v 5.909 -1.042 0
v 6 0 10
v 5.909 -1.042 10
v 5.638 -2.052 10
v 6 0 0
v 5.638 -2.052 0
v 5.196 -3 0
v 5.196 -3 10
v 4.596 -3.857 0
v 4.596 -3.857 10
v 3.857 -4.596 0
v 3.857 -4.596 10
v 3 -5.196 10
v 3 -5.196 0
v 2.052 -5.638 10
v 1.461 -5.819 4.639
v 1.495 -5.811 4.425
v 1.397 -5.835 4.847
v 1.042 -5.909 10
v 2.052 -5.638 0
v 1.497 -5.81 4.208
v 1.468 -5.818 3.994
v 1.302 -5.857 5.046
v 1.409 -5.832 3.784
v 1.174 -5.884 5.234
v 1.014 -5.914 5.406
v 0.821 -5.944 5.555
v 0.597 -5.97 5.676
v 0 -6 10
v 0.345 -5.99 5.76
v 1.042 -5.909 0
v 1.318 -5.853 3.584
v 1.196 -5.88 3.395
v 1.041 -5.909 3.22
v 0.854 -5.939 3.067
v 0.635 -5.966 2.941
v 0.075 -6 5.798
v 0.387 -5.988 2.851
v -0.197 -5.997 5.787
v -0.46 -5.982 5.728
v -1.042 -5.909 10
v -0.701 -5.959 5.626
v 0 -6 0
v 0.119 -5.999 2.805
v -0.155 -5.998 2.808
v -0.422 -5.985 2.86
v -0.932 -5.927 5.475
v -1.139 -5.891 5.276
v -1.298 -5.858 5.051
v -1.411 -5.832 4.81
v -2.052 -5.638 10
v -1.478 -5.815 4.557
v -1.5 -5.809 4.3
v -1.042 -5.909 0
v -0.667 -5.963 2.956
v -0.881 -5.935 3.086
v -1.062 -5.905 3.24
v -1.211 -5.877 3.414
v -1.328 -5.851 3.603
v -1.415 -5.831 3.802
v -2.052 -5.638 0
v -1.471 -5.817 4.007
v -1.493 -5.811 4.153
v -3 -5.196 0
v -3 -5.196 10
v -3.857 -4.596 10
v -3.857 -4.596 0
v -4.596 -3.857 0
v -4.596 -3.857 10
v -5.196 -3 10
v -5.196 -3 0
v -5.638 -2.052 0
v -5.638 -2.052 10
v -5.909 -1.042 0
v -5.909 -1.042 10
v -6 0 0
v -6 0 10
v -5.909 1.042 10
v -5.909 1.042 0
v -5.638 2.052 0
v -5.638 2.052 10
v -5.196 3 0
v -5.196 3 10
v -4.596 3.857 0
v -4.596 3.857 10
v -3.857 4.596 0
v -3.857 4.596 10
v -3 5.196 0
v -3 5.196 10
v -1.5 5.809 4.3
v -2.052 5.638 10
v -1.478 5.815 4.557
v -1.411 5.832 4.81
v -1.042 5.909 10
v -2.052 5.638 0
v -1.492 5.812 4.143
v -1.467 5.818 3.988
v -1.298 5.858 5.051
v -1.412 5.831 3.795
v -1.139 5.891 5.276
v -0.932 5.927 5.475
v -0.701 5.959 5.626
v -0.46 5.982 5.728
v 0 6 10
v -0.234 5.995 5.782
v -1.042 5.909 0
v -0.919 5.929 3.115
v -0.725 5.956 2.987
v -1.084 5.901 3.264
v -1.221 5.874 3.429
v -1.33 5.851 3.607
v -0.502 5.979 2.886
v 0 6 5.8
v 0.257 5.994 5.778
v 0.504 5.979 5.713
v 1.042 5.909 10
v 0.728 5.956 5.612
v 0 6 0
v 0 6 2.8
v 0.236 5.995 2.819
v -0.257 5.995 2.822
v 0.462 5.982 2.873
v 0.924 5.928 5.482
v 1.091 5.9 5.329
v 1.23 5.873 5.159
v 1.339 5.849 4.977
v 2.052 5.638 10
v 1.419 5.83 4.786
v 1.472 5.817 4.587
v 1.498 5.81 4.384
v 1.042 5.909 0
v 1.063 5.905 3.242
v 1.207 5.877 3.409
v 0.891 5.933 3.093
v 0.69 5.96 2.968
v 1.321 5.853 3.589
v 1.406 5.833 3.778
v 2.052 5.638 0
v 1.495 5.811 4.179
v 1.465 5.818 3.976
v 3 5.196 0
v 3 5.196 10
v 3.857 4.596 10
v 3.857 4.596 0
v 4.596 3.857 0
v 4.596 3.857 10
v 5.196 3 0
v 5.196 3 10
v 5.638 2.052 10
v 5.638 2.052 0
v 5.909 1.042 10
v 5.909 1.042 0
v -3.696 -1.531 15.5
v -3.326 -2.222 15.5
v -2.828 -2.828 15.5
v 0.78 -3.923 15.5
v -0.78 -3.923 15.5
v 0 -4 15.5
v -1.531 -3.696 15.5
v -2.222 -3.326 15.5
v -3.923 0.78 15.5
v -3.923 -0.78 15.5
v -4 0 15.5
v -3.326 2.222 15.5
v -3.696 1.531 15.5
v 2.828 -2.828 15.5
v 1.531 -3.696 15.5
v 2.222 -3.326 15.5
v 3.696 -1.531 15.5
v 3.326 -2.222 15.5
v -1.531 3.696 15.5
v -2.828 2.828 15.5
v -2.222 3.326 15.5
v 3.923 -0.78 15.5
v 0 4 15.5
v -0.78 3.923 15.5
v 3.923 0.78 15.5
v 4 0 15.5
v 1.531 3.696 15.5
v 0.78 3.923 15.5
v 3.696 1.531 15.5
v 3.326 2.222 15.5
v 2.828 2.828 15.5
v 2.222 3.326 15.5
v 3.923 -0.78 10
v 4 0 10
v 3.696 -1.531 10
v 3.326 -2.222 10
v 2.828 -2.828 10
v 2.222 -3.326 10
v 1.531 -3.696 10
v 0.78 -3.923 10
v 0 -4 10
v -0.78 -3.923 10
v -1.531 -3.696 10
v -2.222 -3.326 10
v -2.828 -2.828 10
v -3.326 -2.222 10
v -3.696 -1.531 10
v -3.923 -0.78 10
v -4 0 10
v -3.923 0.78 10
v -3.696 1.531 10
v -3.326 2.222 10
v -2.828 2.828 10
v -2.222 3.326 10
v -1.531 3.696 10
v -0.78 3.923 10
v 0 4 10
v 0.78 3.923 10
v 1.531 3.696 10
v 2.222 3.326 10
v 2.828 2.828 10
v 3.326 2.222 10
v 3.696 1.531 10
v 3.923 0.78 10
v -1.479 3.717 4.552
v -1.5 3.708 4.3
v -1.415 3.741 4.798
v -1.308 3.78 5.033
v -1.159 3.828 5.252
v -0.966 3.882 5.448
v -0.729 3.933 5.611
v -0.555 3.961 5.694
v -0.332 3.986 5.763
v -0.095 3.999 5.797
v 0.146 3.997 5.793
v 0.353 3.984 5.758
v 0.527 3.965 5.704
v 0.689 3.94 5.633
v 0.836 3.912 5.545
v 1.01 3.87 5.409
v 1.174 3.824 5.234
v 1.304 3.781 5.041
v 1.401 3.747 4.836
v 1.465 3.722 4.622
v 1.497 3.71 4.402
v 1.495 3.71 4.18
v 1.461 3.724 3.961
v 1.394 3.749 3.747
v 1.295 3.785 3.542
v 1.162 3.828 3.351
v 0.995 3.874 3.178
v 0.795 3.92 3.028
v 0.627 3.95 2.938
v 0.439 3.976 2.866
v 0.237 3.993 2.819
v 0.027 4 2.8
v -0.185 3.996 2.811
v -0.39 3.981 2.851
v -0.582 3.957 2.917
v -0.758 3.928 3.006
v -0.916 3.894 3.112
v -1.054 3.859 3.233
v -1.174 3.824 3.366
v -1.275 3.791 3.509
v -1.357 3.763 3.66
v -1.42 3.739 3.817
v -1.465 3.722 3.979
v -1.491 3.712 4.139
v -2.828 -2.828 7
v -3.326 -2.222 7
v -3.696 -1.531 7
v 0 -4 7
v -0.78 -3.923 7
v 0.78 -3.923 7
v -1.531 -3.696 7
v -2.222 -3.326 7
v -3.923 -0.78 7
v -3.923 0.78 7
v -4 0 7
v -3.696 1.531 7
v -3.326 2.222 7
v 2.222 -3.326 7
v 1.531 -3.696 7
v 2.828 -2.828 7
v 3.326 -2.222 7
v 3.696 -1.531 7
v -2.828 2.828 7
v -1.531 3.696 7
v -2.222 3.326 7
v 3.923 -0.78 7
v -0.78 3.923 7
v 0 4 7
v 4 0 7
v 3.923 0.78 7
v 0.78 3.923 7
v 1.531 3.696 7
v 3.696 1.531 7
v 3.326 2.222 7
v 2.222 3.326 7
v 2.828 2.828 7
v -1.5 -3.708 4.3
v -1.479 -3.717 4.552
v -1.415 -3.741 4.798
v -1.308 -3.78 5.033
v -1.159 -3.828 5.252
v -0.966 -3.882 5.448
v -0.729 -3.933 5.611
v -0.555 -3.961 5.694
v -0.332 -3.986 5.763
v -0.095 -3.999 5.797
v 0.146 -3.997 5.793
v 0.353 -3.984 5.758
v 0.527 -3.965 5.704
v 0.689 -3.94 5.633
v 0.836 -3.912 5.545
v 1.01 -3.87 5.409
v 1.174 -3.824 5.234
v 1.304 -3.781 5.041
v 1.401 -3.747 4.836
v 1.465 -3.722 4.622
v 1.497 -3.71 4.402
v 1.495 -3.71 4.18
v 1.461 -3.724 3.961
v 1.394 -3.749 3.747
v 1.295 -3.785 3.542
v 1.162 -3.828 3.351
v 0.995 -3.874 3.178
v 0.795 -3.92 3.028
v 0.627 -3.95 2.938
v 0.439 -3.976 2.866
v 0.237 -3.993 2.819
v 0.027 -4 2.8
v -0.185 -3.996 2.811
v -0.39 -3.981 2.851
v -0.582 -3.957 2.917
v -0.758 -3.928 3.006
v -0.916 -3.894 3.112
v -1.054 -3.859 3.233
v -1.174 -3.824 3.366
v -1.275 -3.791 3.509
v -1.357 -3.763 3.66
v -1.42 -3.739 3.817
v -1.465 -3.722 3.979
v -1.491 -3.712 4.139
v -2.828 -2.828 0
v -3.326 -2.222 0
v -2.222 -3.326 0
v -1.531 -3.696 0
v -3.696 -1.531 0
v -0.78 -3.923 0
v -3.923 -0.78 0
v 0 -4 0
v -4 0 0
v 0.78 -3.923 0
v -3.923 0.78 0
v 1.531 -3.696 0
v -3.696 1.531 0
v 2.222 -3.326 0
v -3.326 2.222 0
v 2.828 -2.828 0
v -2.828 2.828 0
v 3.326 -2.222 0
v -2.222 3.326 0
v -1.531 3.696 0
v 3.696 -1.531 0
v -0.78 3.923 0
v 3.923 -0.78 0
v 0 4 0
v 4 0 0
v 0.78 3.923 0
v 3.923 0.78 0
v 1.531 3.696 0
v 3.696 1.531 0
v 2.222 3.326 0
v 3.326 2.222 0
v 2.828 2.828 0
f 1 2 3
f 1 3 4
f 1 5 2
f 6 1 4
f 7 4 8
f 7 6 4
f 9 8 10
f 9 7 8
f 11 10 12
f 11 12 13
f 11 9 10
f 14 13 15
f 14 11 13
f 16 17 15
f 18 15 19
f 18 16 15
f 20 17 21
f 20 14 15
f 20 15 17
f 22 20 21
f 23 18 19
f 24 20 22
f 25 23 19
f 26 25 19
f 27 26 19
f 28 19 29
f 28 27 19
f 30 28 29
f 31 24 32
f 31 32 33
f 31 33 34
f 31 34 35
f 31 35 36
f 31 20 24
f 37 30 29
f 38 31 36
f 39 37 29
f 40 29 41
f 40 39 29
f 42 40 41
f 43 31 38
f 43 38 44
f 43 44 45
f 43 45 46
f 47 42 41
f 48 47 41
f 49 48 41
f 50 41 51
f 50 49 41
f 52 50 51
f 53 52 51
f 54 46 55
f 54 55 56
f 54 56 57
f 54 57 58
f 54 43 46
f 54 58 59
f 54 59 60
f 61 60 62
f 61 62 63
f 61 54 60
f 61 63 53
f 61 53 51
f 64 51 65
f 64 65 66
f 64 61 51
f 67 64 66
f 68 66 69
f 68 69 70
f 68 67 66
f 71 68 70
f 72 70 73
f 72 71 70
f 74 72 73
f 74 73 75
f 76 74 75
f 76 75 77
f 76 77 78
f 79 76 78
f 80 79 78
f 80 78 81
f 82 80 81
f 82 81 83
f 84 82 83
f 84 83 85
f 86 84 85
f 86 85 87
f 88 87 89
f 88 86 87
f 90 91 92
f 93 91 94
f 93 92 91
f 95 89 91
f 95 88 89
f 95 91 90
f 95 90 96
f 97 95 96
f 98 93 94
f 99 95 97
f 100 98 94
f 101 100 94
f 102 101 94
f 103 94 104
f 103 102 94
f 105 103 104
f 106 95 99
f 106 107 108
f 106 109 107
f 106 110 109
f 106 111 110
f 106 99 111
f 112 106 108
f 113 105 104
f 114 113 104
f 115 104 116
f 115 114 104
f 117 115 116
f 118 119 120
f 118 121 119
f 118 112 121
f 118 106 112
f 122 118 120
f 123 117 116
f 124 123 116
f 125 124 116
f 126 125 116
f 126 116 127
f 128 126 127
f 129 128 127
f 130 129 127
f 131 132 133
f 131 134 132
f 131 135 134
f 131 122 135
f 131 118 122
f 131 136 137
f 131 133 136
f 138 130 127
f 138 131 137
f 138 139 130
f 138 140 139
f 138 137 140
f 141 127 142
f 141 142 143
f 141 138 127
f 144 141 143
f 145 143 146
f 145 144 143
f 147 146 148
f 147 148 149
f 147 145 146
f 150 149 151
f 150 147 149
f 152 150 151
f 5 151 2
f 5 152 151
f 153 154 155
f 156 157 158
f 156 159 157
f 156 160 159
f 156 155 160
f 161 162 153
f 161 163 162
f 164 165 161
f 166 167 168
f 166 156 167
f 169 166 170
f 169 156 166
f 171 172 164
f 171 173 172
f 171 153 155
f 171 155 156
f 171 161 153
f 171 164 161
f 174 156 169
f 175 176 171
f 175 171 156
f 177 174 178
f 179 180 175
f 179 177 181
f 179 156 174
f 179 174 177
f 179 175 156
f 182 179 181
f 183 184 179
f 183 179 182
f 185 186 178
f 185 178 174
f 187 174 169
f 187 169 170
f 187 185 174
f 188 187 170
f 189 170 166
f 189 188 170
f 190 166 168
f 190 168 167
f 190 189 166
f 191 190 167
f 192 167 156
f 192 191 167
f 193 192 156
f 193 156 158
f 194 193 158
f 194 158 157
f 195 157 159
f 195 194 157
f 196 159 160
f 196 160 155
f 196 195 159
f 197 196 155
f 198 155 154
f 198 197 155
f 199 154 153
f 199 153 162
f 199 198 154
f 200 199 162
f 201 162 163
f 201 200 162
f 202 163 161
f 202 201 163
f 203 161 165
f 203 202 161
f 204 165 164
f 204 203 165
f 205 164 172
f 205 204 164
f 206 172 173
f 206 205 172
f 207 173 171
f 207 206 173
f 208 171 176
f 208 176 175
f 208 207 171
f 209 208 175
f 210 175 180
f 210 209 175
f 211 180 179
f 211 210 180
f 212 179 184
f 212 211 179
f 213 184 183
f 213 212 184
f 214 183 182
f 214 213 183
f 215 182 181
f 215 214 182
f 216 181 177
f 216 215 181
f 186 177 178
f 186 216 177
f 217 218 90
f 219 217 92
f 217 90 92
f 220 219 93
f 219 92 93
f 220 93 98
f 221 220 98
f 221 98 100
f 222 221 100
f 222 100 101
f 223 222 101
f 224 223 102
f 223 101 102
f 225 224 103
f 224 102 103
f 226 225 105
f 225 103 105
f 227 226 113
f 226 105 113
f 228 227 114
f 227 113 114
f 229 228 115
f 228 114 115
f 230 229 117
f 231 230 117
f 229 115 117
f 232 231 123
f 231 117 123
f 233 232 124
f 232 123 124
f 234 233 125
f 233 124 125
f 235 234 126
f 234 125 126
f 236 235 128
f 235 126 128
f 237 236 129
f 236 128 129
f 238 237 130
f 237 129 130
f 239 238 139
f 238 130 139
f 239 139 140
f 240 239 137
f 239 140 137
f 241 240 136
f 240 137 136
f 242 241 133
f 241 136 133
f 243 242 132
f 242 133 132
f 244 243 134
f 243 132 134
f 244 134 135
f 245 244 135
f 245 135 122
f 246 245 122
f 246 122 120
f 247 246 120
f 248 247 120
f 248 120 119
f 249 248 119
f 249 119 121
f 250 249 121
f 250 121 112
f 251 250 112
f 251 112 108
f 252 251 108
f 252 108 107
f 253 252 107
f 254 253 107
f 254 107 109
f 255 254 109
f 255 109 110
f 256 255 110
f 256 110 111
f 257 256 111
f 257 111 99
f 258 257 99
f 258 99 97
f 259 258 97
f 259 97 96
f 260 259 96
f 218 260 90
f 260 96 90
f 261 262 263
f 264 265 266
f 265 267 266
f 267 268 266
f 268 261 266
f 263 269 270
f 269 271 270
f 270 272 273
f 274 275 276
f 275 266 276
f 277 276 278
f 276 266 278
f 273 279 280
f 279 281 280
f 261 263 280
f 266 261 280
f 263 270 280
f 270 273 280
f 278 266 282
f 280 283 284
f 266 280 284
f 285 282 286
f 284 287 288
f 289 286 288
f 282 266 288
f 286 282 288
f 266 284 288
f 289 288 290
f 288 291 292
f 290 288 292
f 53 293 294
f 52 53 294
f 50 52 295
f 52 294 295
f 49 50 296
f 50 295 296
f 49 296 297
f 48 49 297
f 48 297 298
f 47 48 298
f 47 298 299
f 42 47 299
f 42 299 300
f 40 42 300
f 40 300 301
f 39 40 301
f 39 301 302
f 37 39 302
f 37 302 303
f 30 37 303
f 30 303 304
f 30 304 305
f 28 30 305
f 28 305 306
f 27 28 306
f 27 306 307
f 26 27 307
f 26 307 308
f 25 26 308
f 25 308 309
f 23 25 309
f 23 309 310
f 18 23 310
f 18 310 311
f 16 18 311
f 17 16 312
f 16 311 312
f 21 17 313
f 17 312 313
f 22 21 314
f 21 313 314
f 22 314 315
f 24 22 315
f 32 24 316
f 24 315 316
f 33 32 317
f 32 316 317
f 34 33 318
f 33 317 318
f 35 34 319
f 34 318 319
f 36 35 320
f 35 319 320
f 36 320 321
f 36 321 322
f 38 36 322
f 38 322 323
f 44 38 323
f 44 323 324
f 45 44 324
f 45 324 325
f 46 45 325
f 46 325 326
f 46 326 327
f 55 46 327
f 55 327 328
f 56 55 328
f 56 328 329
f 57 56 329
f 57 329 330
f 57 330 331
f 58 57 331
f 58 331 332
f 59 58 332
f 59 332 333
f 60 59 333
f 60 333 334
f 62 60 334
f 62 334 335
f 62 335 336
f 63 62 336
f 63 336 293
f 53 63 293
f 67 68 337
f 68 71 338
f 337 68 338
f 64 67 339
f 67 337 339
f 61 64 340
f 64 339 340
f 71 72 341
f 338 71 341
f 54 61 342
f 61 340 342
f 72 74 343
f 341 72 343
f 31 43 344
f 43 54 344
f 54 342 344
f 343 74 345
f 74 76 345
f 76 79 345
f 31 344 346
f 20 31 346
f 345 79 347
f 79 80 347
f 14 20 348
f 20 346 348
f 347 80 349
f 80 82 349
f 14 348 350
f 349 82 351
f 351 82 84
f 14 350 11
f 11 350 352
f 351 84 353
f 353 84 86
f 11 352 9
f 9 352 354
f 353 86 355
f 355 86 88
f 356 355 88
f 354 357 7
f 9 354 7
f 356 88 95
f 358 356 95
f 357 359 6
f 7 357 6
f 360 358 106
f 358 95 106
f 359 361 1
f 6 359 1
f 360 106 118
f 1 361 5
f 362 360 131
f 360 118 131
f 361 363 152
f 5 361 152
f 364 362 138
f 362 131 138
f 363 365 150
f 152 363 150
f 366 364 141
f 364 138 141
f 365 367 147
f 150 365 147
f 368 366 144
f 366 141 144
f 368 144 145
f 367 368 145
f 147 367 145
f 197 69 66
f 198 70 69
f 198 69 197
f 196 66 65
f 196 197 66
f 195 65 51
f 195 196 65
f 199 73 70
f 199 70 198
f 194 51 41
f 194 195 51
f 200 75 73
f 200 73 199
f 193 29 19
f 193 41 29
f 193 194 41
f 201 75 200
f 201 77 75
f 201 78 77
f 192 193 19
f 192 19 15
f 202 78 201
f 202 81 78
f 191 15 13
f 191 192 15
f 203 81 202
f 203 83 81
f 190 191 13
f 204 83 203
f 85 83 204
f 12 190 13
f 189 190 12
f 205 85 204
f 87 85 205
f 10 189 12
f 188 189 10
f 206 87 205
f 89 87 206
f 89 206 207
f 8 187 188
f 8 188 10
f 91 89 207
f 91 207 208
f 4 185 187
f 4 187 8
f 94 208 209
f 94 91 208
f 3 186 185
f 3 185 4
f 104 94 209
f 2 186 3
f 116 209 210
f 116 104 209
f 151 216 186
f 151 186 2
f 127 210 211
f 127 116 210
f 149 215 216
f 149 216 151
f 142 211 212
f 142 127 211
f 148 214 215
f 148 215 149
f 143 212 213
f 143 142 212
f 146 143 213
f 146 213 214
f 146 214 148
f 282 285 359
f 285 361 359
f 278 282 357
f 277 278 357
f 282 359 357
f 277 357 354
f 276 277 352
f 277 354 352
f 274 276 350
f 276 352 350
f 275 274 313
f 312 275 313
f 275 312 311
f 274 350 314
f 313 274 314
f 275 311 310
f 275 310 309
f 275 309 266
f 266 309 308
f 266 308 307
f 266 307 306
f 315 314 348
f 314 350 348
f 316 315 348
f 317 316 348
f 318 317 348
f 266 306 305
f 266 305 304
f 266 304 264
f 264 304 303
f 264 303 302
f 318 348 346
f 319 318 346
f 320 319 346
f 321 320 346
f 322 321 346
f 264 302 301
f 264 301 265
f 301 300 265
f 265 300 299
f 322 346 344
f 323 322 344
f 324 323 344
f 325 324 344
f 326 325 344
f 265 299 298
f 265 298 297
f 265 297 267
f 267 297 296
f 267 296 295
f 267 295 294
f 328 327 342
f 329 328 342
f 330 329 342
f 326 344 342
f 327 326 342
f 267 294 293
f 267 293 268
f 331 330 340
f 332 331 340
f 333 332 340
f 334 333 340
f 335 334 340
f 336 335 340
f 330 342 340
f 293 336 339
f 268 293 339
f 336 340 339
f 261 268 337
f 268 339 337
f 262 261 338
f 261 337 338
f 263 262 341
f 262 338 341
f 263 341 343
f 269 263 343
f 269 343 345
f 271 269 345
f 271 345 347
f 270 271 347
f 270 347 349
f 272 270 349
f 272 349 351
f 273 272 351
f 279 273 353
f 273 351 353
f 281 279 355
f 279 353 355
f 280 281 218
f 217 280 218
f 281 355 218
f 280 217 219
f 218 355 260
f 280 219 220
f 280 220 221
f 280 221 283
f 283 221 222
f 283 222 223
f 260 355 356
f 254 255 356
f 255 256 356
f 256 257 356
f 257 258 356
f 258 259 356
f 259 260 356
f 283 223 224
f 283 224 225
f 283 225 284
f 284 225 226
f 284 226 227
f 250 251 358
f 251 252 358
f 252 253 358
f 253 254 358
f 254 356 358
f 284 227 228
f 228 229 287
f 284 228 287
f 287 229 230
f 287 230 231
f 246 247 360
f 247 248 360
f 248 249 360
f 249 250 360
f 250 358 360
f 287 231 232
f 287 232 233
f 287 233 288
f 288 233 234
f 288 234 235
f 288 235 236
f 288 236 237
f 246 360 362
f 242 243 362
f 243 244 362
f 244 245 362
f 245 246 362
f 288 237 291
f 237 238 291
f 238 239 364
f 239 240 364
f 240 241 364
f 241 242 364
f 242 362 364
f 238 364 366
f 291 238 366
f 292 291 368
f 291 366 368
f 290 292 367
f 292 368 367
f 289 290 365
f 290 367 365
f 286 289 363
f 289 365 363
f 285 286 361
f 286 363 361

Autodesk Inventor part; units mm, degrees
ref_plane "YZ Plane" through (0, 0, 0) normal (1, 0, 0) x (0, 1, 0)
ref_plane "XZ Plane" through (0, 0, 0) normal (0, 1, 0) x (-1, 0, 0)
sketch "Sketch1" plane through (0, 0, 0) normal (0, 0, 1) x (1, 0, 0)
  circle A0 centre (0, 0) radius 4
  circle A1 centre (0, 0) radius 6
  dimension "d0" = 8
  dimension "d1" = 2
extrude "Extrusion1" add sketch "Sketch1" along normal blind 10
sketch "Sketch2" plane through (0, 0, 10) normal (0, 0, 1) x (1, 0, 0)
  circle A0 centre (0, 0) radius 4
  dimension "d4" = 8
extrude "Extrusion2" add sketch "Sketch2" along normal mid plane 6
move faces "Move1" translate (0, 0, 2.5) faces at (0.7574, 1.0973, 13)
sketch "Sketch3" plane through (0, 0, 0) normal (0, 0, -1) x (-1, 0, 0)
  line L0 (0, 0) -> (0, 6)
  circle A0 centre (0, 0) radius 6 projected
ref_plane "Work Plane1" through (0, 6, 0) normal (0, 1, 0) x (-1, 0, 0)
sketch "Sketch4" plane through (0, 6, 0) normal (0, 1, 0) x (-1, 0, 0)
  circle A0 centre (0, 4.3) radius 1.5
  point P0 (0, 0)
  dimension "d10" = 3
  dimension "d11" = 4.3
extrude "Extrusion3" cut sketch "Sketch4" against normal through all
properties part number "shaft_extension"
